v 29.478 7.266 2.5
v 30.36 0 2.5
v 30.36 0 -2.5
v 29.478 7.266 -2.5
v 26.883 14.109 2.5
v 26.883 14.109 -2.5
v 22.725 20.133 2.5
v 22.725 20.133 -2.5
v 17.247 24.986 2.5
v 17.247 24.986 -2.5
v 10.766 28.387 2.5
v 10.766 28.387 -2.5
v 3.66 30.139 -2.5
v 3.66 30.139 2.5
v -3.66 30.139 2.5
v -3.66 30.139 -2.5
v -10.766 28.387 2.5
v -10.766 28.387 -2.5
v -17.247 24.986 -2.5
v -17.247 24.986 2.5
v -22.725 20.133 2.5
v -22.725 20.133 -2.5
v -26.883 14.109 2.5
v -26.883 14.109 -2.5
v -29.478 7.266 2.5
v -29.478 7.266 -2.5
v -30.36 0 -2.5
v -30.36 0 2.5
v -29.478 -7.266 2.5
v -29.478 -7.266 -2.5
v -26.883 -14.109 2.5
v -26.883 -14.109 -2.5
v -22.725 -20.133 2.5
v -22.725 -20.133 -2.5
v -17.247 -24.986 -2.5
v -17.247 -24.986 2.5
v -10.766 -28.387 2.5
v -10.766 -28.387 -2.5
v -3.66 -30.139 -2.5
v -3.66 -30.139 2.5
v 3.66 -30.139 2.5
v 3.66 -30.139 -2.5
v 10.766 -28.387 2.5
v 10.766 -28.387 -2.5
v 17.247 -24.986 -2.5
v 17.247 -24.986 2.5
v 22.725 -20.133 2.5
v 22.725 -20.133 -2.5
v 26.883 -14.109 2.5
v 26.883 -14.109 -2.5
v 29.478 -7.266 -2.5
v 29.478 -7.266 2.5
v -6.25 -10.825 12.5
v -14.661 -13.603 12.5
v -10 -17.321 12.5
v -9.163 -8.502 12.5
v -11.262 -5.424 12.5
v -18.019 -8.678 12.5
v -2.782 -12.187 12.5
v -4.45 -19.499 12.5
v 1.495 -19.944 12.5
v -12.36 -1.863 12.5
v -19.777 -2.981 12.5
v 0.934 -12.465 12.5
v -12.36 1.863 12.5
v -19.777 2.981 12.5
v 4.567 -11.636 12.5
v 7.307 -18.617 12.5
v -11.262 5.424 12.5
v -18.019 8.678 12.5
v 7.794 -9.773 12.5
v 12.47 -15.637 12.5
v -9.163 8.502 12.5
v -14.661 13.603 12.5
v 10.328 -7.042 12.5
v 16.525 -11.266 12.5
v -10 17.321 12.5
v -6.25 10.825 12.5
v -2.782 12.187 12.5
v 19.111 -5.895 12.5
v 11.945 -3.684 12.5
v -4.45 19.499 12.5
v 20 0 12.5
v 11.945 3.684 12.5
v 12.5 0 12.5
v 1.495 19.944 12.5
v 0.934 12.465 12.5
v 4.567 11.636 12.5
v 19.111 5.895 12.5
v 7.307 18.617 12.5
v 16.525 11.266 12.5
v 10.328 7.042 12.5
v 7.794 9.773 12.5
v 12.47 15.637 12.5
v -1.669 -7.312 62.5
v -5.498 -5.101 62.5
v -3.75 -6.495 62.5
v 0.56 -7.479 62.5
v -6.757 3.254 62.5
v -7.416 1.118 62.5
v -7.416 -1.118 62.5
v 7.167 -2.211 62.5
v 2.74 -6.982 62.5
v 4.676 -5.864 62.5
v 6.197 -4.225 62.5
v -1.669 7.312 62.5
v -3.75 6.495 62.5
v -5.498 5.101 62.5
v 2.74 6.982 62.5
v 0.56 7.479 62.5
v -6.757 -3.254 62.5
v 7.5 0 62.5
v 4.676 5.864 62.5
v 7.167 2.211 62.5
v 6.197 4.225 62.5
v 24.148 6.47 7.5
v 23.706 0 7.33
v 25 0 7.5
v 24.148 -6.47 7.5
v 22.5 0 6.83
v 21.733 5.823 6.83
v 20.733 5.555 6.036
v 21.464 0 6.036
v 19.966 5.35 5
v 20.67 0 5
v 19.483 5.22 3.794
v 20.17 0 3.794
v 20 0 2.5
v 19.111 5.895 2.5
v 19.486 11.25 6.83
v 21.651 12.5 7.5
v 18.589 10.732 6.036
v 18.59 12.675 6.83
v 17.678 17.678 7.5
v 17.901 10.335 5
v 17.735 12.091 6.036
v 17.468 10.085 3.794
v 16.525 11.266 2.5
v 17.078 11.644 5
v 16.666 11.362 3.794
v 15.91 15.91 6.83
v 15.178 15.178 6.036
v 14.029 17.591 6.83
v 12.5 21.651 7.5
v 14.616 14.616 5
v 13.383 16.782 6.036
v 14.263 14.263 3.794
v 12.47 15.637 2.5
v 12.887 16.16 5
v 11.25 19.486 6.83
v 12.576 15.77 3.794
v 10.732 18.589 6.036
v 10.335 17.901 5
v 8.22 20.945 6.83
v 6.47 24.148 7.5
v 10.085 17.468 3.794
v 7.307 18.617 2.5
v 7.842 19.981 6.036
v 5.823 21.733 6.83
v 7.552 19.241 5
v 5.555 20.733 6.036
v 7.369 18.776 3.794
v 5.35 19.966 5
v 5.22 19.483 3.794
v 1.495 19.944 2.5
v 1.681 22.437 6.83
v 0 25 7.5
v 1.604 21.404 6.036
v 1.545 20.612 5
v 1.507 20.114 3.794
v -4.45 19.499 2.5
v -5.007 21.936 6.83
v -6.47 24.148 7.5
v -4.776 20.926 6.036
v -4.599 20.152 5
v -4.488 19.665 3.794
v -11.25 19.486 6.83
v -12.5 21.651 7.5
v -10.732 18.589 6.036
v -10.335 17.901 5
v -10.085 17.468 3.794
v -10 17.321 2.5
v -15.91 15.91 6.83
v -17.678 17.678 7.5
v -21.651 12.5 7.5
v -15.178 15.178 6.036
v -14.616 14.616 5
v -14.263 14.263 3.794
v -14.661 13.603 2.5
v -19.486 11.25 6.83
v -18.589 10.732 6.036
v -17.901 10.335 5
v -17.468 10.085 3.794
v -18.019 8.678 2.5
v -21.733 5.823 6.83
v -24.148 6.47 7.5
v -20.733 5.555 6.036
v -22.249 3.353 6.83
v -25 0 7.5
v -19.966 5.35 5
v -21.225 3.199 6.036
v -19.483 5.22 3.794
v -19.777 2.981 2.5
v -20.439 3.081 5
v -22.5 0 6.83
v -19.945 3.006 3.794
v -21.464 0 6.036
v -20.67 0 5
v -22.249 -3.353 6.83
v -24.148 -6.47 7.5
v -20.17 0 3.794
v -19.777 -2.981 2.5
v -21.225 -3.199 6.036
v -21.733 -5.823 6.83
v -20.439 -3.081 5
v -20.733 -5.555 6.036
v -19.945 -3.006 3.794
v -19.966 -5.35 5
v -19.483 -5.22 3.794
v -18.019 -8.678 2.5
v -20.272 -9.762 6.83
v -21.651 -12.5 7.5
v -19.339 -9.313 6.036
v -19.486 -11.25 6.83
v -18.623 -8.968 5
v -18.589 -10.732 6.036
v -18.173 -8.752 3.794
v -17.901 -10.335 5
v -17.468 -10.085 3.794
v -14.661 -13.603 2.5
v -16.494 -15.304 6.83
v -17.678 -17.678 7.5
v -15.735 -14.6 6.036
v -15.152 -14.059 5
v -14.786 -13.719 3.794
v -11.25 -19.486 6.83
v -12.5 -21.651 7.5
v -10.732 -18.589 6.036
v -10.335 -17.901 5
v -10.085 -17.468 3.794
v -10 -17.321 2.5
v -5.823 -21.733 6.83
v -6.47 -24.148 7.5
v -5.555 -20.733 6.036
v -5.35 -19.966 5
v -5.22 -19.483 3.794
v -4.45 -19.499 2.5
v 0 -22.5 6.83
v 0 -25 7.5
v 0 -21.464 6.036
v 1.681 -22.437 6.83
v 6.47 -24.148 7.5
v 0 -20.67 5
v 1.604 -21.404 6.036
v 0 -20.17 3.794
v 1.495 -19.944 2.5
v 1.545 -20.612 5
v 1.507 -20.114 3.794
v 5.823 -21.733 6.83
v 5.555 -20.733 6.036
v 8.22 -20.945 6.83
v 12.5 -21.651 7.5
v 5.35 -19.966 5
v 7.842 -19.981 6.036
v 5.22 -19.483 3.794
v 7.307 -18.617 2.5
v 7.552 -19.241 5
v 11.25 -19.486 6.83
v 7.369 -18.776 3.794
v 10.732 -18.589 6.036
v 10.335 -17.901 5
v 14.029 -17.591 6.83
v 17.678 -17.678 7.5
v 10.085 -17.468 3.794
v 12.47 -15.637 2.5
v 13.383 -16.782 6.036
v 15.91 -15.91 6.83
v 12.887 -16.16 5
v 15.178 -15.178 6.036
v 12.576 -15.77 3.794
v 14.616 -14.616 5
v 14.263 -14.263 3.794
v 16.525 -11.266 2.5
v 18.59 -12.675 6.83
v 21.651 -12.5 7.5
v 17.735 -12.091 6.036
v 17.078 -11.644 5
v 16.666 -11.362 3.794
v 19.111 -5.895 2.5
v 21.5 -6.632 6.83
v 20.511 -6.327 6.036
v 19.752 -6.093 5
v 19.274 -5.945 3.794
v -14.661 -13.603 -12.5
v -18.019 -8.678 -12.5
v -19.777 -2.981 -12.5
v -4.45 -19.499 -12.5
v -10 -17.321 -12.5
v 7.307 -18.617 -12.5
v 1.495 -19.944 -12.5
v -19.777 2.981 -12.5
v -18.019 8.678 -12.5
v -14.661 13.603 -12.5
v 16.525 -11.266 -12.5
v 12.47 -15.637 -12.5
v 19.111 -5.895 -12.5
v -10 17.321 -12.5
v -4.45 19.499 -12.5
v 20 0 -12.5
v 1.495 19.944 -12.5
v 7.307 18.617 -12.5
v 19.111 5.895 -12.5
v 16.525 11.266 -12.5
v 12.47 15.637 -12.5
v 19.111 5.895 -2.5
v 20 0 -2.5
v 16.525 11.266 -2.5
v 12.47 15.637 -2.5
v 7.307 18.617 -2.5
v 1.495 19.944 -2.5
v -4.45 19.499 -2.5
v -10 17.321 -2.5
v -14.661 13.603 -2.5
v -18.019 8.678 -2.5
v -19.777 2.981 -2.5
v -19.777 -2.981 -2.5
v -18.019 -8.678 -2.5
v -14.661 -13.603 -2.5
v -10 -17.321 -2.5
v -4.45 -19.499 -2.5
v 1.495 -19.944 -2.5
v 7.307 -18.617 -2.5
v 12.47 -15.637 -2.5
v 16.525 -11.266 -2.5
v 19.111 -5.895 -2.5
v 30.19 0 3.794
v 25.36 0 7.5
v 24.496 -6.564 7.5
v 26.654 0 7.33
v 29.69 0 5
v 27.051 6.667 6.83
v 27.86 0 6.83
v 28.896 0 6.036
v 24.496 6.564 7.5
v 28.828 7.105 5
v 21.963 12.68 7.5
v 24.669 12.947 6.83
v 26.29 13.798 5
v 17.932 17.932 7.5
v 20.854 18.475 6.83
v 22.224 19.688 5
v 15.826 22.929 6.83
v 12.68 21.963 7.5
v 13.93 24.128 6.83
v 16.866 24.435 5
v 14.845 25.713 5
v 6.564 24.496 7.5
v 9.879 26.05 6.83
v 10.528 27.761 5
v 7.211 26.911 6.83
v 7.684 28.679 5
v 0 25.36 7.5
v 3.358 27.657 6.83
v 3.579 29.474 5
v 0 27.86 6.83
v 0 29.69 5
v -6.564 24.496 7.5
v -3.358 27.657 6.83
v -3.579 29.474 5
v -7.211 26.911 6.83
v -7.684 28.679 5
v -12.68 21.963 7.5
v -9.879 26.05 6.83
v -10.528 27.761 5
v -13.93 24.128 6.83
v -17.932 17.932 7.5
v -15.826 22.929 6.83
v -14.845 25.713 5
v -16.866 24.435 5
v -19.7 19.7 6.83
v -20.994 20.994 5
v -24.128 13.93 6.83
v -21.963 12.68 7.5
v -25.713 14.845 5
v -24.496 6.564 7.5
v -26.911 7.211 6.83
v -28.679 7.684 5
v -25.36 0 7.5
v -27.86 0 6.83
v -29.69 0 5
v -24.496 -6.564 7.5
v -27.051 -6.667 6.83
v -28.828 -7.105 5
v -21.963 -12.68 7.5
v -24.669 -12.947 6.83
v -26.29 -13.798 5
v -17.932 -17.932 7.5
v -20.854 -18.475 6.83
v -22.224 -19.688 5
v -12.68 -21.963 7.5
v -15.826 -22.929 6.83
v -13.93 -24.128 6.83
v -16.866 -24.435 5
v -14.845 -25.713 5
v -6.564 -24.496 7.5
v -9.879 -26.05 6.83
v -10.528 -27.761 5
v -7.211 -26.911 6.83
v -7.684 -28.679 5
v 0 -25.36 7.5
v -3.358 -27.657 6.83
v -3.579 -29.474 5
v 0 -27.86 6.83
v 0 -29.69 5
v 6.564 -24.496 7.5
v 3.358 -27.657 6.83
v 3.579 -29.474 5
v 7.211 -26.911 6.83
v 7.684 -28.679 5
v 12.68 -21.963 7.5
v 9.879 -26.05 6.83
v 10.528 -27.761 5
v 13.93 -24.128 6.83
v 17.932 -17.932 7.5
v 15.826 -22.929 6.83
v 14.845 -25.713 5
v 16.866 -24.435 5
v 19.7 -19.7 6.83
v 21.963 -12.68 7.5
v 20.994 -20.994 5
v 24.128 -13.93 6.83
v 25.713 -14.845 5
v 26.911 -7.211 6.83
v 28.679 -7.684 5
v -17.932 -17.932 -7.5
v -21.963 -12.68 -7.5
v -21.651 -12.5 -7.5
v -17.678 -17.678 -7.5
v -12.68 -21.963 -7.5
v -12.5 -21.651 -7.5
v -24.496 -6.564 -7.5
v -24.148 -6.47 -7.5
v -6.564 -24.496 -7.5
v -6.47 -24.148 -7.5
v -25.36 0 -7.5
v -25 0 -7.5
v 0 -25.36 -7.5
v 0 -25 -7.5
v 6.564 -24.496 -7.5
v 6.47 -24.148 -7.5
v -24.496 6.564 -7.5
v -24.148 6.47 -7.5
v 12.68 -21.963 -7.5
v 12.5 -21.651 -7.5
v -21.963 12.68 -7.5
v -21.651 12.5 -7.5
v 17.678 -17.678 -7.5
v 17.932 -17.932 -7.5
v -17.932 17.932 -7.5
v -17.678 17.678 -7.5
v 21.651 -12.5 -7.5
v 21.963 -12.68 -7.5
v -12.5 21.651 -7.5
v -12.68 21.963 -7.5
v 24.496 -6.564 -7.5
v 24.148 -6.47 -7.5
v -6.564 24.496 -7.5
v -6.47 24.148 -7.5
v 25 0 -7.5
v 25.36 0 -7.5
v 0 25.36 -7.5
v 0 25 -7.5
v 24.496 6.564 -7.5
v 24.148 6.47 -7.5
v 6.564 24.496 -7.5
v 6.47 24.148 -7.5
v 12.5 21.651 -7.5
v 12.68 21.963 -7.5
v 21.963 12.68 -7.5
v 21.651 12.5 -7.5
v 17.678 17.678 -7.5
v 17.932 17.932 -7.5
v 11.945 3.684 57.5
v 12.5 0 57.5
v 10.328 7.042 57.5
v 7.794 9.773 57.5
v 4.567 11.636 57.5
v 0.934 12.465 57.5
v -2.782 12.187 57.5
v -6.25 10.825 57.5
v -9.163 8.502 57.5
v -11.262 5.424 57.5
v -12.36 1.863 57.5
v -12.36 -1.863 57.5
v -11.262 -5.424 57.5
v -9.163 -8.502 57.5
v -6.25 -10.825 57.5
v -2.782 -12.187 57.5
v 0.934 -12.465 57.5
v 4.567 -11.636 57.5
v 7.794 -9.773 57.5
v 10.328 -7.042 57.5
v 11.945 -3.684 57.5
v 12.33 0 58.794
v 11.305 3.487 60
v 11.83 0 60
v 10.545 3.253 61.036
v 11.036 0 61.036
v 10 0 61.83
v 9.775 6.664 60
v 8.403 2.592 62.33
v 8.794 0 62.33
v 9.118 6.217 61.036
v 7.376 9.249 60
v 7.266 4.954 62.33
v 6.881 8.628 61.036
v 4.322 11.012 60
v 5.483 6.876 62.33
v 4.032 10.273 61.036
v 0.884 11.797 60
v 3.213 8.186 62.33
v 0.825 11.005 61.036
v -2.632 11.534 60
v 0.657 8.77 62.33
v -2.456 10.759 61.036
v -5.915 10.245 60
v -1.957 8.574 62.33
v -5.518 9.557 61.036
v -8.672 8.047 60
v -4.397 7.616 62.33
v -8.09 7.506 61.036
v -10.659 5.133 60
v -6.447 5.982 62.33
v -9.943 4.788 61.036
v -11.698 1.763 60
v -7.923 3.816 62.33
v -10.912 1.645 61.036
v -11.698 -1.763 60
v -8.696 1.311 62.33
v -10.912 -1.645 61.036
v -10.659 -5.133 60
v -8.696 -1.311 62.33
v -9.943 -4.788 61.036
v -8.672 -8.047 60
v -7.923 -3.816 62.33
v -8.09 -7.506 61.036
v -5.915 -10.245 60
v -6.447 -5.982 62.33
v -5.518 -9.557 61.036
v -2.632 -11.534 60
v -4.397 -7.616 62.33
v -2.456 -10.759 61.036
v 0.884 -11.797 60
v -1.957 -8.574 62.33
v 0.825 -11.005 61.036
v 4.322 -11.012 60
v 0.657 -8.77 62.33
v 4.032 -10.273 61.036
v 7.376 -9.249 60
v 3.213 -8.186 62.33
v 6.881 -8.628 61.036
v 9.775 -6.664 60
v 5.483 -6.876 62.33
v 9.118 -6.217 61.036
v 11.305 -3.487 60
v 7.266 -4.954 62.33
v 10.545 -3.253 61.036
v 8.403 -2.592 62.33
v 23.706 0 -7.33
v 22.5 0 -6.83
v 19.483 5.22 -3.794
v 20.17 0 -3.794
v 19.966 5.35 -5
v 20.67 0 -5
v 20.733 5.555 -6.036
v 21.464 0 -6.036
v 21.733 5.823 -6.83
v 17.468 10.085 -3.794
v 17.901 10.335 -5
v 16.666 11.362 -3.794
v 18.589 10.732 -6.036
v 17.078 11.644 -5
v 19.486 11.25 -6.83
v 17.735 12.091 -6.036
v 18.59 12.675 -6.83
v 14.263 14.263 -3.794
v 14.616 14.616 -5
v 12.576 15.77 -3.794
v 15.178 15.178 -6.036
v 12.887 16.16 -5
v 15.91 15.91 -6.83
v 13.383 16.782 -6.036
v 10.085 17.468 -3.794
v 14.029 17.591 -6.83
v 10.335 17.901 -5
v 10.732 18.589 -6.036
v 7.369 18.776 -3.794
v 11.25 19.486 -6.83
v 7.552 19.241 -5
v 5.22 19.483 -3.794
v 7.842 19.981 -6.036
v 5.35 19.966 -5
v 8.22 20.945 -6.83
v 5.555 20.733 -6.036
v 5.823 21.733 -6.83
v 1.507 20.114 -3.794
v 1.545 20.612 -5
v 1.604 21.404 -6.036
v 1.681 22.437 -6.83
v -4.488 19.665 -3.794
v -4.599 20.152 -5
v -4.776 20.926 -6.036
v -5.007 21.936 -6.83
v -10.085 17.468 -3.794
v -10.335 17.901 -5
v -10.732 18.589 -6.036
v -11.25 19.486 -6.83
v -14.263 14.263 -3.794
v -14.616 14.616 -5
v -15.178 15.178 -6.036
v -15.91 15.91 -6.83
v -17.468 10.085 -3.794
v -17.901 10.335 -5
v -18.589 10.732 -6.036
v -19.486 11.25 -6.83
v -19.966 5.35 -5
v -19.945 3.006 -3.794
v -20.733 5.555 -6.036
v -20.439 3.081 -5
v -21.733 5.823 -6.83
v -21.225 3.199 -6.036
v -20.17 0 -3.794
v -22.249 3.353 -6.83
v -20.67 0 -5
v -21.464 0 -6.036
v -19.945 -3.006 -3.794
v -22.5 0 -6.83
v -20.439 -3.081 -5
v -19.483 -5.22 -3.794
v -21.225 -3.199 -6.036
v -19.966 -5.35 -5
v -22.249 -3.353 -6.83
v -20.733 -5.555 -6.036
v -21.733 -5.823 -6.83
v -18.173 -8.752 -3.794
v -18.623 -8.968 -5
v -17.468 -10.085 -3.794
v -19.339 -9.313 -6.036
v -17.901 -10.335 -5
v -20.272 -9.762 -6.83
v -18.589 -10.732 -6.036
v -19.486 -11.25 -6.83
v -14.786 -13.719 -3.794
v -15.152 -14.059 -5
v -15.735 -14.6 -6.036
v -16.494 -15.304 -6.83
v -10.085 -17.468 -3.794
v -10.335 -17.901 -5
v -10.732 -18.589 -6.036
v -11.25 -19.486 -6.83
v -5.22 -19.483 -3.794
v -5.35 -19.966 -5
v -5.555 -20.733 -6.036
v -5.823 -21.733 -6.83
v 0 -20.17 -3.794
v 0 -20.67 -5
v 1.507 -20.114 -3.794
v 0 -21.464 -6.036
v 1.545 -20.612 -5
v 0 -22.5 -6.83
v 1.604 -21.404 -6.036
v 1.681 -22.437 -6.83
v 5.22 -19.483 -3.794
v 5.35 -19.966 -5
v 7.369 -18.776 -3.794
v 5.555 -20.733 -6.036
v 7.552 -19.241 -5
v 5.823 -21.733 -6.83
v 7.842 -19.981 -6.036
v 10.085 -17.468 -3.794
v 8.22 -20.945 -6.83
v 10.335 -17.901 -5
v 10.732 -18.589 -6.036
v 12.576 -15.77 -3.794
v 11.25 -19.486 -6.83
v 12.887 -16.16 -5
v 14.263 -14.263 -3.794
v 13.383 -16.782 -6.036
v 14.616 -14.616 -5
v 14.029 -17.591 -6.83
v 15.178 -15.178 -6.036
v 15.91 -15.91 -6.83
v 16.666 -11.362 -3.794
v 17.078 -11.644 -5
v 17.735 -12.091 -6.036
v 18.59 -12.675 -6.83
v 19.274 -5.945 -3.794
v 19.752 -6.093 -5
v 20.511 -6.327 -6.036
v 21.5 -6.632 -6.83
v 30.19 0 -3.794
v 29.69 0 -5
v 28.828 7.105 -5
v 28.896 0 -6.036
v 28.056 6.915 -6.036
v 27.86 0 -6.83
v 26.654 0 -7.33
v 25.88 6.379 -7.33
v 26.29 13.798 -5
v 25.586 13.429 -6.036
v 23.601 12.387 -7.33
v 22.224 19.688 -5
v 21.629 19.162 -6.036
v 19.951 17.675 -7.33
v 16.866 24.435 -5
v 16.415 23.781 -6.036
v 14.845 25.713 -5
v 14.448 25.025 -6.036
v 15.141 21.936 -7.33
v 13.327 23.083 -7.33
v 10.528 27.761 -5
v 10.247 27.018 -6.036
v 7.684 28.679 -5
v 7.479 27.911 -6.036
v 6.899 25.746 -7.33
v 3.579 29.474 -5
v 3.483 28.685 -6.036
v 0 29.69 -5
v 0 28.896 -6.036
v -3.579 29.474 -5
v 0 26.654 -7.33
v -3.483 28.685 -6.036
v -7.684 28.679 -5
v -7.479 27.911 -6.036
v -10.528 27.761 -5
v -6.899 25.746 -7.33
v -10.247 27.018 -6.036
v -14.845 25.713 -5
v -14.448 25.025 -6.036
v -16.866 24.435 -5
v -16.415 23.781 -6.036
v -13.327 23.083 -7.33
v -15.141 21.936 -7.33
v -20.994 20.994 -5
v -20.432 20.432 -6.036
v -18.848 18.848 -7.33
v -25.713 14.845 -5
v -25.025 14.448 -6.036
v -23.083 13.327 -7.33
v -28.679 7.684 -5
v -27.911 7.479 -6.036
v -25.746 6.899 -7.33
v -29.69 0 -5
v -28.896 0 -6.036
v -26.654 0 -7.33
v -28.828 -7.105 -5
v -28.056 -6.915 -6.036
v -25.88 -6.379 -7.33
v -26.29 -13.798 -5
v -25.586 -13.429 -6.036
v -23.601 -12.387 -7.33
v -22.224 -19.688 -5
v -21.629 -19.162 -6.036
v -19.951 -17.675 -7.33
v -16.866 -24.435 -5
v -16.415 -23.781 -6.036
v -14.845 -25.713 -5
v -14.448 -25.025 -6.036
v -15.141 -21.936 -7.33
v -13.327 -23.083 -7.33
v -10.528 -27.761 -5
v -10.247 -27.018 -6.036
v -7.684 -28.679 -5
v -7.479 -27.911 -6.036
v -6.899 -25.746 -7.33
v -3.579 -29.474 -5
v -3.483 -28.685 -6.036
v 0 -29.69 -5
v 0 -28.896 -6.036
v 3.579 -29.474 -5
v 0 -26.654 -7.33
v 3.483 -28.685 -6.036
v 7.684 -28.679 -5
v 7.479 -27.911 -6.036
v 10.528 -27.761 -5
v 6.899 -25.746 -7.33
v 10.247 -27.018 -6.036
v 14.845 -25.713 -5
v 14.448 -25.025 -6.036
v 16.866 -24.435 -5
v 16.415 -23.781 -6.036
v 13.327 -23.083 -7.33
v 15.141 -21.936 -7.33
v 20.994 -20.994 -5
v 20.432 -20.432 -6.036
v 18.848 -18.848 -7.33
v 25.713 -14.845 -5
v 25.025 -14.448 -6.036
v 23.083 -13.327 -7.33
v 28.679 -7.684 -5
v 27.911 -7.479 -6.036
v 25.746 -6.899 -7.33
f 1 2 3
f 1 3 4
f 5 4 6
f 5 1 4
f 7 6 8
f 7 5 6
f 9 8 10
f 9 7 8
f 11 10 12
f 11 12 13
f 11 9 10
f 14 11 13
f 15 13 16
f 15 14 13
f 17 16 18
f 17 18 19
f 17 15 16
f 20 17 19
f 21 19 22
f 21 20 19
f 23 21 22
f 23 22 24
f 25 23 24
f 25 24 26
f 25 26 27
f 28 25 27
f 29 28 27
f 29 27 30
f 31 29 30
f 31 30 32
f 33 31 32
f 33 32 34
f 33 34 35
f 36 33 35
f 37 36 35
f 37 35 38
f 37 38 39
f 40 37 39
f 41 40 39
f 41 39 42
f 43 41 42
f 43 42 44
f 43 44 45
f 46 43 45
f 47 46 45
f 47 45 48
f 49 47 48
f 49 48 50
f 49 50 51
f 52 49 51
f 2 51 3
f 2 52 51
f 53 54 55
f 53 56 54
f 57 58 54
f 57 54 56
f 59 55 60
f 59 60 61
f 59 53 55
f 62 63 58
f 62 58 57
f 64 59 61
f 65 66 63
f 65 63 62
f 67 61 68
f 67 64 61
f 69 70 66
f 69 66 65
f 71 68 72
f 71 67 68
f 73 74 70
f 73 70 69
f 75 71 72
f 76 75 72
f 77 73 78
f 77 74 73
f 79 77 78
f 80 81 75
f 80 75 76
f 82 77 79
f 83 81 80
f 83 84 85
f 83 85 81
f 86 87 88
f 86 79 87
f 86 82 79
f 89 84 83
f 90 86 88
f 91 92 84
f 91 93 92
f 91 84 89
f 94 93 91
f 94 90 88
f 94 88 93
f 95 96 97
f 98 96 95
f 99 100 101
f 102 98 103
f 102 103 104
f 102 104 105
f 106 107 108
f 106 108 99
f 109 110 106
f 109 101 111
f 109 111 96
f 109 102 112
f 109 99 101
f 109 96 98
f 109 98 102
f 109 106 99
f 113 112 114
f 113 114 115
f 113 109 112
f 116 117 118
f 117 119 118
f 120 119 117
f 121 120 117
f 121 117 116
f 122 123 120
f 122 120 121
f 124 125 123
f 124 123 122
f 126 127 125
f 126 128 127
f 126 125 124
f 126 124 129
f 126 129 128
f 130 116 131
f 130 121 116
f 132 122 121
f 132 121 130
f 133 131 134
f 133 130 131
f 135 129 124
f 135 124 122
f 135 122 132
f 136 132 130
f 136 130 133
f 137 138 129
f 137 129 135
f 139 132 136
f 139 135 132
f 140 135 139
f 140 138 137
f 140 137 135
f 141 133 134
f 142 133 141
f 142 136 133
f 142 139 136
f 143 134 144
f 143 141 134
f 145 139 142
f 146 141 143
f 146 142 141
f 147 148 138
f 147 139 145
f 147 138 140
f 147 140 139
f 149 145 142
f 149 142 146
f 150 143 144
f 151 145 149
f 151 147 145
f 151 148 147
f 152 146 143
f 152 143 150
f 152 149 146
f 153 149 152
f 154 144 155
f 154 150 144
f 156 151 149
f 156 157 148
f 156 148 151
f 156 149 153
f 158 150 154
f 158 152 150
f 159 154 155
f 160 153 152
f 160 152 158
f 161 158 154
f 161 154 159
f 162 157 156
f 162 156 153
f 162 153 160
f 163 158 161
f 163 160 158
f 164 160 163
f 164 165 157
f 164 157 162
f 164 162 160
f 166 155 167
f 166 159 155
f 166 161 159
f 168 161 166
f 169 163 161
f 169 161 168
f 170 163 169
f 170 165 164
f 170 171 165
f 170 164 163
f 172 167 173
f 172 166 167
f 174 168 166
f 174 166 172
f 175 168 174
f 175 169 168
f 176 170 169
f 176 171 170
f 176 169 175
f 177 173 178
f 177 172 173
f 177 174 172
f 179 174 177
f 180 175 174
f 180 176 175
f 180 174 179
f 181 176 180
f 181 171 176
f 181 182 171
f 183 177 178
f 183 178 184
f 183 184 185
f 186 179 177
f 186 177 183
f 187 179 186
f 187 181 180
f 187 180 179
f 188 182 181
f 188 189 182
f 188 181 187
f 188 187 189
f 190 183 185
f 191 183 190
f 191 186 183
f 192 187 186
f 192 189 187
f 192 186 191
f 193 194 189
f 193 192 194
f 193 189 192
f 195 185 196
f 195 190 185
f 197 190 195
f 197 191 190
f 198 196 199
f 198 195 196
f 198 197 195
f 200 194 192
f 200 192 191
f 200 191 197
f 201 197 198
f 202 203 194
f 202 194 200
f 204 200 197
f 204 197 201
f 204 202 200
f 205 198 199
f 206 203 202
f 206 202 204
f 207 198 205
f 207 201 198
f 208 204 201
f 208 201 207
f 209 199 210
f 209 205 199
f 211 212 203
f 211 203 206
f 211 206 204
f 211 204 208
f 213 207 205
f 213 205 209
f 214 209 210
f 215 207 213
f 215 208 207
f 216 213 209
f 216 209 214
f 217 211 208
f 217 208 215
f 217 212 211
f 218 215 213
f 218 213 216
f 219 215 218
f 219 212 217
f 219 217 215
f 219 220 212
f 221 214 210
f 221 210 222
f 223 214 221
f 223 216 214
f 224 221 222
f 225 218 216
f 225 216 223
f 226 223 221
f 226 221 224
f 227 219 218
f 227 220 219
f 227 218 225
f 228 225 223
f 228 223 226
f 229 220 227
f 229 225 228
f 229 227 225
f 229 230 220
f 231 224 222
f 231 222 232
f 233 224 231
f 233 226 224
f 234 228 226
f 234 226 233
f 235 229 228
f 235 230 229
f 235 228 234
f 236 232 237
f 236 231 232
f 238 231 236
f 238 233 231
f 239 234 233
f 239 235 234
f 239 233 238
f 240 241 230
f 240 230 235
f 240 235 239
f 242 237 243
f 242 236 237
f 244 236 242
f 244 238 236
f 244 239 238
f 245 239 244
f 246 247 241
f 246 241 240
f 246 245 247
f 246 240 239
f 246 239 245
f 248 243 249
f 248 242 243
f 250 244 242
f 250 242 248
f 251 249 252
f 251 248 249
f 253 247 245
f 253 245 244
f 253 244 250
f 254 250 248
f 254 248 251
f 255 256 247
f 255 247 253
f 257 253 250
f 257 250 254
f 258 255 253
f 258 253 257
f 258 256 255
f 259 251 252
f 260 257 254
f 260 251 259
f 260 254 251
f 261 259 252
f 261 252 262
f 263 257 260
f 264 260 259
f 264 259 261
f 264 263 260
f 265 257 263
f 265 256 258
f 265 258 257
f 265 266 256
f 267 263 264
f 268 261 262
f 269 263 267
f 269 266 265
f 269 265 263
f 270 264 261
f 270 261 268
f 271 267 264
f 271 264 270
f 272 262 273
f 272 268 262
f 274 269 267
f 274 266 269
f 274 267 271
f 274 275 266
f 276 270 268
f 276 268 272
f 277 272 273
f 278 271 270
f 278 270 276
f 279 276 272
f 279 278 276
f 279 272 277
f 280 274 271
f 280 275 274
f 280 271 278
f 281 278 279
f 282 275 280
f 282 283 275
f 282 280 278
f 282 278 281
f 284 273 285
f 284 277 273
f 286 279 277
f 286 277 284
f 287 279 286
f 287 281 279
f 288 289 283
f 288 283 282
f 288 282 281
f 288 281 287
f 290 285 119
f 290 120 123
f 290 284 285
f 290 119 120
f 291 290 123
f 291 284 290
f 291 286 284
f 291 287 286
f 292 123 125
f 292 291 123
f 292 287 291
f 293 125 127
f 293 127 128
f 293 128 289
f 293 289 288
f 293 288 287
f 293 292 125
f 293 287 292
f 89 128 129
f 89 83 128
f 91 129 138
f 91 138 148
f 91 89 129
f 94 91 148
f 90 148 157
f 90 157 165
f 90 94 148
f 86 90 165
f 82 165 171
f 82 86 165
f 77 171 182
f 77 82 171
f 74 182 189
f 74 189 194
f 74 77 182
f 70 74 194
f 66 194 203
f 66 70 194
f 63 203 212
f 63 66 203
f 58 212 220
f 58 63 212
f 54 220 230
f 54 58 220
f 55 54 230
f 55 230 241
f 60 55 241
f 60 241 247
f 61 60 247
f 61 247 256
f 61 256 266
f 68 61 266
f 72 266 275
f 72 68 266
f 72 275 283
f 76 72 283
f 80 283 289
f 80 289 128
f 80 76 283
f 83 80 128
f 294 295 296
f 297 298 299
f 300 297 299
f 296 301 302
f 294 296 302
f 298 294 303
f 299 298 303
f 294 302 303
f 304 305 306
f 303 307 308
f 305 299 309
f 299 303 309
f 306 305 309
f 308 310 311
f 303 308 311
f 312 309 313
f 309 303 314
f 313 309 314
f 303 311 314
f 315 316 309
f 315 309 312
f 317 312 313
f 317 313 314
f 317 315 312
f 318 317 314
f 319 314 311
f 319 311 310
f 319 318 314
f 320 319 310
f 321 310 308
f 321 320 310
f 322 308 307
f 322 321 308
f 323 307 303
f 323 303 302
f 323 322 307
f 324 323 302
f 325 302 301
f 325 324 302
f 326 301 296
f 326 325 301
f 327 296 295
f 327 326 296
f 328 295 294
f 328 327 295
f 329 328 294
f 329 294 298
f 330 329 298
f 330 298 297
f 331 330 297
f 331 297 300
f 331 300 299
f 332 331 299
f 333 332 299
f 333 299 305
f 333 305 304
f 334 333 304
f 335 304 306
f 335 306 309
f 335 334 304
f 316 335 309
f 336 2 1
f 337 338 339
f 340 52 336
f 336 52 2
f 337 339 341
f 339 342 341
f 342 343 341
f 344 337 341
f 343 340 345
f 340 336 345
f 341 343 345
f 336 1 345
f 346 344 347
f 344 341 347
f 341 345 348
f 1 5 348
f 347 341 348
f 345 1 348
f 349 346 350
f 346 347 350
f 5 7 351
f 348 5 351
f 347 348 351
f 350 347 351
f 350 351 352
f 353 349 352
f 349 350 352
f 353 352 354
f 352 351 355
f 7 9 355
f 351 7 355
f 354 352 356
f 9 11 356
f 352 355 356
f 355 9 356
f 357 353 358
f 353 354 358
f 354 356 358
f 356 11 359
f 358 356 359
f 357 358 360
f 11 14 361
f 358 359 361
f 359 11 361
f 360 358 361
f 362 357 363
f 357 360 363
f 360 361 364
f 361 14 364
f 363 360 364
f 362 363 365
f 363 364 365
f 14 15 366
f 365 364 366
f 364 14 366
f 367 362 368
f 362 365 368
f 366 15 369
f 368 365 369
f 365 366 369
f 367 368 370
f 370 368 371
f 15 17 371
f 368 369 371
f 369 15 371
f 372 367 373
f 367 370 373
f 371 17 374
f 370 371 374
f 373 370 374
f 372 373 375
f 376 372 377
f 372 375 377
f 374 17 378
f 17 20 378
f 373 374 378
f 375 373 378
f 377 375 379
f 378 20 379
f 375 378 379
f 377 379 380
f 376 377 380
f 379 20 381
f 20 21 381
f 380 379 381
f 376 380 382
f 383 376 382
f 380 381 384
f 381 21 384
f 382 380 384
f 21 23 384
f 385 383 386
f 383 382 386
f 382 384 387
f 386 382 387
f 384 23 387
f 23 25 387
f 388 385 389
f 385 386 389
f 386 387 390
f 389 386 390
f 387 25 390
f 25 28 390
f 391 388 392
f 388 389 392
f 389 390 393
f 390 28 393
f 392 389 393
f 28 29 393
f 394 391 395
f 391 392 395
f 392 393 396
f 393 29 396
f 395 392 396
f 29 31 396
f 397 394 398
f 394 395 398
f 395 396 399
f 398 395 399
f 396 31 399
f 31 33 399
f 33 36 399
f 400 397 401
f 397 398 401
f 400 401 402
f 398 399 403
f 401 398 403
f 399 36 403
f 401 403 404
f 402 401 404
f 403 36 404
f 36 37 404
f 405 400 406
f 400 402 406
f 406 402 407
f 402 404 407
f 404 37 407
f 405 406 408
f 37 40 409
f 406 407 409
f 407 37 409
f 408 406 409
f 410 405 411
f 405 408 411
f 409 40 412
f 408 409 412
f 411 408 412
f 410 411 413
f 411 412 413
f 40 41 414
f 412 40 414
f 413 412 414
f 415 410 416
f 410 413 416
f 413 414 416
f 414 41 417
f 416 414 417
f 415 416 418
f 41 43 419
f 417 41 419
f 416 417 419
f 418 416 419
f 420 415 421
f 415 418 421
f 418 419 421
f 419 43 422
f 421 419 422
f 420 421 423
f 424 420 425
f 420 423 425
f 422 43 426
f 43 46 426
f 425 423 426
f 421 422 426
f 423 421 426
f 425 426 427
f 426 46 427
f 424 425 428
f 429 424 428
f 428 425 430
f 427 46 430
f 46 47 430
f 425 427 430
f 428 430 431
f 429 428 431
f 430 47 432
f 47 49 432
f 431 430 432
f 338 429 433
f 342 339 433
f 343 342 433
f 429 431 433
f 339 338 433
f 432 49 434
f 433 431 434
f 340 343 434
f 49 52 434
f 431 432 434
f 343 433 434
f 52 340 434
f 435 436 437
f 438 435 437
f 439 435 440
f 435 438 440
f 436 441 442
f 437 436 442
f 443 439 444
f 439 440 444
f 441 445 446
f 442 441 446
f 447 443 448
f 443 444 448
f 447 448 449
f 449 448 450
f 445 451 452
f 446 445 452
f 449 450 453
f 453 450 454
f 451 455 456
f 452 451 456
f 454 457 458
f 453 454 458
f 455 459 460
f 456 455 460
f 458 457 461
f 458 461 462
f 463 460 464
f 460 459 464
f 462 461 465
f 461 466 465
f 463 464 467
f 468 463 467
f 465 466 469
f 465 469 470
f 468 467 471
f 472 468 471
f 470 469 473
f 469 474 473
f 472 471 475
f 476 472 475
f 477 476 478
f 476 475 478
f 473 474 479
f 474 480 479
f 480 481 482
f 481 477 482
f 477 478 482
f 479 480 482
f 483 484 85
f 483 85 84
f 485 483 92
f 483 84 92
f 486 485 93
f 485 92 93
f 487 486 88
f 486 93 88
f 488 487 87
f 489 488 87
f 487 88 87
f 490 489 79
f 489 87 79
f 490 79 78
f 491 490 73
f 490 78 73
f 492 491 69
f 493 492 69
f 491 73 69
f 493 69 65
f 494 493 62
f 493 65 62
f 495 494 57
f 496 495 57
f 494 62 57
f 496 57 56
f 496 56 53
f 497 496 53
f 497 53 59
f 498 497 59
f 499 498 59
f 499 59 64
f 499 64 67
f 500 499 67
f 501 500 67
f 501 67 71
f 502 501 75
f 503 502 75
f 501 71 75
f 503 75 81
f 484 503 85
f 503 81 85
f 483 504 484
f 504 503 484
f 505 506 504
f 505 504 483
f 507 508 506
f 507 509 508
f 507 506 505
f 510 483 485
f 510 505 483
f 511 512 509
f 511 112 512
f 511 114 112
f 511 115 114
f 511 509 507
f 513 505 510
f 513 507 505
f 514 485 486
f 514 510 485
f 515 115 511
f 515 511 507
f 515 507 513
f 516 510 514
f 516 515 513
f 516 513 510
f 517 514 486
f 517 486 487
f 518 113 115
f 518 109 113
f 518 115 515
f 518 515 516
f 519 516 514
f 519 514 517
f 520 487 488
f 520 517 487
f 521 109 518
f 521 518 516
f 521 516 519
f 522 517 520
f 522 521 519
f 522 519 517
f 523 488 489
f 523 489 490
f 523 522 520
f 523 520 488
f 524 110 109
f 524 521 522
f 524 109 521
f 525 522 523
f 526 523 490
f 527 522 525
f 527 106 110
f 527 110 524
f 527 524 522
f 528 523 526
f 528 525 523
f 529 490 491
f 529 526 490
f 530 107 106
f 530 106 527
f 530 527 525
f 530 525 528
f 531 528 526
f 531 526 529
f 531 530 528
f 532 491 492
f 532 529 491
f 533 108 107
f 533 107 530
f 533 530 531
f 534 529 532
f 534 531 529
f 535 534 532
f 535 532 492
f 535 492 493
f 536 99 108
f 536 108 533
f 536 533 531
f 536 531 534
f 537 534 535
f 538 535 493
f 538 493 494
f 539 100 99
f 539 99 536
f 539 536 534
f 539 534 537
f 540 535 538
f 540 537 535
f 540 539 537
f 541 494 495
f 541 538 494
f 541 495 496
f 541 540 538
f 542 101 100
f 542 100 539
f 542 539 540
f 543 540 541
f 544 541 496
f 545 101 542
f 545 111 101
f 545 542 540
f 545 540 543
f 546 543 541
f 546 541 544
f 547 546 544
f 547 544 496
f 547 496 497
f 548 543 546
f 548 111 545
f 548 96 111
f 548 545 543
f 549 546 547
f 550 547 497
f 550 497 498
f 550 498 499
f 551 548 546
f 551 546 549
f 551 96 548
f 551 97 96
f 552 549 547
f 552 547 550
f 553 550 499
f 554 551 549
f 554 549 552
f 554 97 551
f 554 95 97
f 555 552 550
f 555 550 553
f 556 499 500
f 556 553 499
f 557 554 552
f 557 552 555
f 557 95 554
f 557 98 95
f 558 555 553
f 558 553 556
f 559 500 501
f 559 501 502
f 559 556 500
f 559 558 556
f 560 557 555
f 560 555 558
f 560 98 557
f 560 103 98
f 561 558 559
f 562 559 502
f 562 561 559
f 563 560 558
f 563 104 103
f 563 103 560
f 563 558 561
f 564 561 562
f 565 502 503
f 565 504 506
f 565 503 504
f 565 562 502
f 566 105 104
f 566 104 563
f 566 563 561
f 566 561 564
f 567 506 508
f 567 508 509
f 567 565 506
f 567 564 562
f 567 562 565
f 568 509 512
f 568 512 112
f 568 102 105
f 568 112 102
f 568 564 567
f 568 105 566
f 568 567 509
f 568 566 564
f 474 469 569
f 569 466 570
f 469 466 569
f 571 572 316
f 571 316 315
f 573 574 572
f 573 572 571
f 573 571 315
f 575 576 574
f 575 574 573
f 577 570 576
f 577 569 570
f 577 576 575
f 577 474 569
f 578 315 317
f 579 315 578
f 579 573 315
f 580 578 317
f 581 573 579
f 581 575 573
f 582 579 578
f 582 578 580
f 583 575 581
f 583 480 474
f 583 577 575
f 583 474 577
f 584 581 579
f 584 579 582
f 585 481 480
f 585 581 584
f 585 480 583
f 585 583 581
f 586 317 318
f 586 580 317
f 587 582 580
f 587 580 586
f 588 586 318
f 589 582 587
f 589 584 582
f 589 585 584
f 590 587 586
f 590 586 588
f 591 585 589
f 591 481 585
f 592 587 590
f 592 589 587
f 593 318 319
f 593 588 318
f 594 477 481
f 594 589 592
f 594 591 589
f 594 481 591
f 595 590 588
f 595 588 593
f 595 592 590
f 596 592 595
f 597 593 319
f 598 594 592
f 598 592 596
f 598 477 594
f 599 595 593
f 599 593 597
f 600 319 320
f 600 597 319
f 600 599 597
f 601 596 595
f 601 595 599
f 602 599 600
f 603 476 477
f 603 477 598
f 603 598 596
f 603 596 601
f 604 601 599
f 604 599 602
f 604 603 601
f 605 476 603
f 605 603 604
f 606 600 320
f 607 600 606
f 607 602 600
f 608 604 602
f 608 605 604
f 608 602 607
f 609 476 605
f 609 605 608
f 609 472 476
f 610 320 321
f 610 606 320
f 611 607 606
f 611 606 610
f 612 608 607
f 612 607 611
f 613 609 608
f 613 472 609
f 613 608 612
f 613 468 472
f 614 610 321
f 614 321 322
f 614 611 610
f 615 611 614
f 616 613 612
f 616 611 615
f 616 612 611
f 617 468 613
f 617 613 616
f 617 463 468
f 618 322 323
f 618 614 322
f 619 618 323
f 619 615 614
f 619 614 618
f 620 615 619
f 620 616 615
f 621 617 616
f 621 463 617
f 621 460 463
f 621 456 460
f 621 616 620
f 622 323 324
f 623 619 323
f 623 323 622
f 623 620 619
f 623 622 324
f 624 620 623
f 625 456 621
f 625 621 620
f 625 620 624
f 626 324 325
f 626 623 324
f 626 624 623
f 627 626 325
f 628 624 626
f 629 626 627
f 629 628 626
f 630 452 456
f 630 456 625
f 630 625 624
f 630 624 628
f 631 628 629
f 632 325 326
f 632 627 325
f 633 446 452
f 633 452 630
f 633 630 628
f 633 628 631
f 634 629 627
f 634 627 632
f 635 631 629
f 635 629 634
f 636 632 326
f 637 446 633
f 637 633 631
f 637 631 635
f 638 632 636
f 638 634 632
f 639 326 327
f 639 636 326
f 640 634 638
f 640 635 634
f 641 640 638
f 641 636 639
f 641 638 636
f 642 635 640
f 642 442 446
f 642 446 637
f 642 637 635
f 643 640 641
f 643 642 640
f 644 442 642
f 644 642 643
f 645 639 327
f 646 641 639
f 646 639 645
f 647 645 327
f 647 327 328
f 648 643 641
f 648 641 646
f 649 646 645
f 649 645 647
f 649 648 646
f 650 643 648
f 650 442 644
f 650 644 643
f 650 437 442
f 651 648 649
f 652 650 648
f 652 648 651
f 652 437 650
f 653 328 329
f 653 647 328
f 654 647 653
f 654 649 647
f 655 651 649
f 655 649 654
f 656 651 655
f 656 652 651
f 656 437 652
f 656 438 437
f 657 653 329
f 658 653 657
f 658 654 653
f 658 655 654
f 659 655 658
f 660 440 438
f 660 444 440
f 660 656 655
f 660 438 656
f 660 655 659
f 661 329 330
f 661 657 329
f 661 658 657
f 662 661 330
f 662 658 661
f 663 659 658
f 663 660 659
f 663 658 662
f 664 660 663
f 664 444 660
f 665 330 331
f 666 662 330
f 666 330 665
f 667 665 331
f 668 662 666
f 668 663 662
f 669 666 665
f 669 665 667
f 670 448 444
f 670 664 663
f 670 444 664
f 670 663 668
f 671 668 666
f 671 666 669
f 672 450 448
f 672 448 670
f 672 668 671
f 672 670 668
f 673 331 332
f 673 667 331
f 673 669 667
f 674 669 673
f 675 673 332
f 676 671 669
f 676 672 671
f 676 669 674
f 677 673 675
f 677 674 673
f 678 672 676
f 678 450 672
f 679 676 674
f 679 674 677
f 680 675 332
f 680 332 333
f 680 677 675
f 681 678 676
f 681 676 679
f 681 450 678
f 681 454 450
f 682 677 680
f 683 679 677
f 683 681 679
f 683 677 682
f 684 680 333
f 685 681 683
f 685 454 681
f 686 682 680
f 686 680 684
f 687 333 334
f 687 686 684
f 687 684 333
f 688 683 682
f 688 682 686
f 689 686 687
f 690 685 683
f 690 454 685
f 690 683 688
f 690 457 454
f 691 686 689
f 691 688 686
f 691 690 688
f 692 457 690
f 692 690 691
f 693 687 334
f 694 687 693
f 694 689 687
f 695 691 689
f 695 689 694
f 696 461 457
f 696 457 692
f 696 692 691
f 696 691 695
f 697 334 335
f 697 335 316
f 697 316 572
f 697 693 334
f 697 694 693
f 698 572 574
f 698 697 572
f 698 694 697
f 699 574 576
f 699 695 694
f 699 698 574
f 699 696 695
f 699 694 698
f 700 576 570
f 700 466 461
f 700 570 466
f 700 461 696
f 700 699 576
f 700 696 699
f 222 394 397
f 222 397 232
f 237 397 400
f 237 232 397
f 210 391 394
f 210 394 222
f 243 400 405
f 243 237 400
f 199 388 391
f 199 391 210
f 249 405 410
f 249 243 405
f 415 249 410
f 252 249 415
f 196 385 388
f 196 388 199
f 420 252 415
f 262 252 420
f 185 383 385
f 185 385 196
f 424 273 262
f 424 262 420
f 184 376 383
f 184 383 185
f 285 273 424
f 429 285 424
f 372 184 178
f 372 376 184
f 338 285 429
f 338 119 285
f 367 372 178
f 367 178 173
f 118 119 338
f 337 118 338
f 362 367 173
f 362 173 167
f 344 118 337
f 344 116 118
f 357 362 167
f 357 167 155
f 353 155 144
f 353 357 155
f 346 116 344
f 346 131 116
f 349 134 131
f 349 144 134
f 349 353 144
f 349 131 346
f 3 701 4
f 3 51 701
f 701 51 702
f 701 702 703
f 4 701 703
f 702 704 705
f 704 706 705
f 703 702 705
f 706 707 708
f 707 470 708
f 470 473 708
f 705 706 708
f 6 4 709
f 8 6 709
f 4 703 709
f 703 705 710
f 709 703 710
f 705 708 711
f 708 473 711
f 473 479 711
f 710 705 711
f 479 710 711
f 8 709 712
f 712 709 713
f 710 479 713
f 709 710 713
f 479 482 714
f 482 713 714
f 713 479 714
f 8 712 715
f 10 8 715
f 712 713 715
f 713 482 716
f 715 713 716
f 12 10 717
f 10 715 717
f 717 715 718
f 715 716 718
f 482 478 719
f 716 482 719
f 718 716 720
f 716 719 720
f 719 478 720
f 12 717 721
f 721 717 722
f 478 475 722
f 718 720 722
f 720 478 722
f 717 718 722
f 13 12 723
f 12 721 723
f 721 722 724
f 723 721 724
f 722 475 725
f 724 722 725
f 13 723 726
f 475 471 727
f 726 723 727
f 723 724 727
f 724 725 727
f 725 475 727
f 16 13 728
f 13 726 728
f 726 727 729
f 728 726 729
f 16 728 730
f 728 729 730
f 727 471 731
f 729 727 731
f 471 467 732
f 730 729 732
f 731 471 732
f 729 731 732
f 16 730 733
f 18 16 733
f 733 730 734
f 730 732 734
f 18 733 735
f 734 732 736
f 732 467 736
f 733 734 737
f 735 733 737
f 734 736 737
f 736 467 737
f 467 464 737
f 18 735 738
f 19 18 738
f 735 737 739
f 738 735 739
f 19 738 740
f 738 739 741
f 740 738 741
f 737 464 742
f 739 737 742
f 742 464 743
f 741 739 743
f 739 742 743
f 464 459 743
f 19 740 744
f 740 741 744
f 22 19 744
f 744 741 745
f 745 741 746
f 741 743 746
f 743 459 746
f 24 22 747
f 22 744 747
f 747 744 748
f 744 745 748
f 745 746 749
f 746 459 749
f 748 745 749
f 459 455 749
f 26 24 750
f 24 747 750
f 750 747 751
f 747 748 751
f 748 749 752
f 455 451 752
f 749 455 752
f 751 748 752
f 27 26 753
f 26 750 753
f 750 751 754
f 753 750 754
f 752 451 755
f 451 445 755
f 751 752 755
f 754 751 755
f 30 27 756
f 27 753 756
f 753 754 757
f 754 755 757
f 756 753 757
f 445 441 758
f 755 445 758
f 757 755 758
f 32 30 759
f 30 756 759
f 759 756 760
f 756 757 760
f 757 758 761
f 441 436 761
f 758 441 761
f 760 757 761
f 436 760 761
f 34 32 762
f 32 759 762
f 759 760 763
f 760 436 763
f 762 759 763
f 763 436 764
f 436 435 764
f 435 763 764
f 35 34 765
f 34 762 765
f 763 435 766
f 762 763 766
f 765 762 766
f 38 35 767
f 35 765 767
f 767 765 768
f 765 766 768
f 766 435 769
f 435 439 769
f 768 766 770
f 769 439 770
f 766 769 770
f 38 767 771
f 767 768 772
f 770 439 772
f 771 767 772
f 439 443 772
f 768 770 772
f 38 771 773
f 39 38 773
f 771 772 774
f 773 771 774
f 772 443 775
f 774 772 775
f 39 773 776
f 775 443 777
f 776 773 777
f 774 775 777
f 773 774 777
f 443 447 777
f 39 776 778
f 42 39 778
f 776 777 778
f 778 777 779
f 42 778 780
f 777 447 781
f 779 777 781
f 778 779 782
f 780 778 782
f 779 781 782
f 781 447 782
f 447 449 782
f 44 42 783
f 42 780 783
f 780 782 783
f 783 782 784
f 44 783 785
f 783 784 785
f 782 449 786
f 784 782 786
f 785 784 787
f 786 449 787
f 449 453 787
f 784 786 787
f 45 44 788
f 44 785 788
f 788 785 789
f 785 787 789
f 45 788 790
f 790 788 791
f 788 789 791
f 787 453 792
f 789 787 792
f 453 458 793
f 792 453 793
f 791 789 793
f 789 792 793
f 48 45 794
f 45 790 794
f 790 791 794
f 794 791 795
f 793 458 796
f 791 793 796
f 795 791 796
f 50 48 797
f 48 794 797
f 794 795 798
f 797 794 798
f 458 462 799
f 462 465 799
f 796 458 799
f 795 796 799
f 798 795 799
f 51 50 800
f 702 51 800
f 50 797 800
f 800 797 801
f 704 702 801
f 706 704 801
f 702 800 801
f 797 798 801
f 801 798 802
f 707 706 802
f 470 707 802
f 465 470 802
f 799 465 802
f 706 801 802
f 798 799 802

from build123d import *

# Parameters (mm, degrees)
F0_R     = 30.360351
F0_R_2   = 20
F1_DEPTH = 7.5
F2_R     = 5
F3_R     = 5
F4_R     = 5
F5_DEPTH = 12.5
F6_R     = 12.5
F7_DEPTH = 50
F8_R     = 5


with BuildPart() as f1:
    # F0 (on Top) → F1 (new body, symmetric)
    with BuildSketch(Plane.XY):
        Circle(F0_R)
        Circle(F0_R_2, mode=Mode.SUBTRACT)
    extrude(amount=F1_DEPTH, both=True)

    # F2
    f2_edges = [f1.edges().sort_by_distance(p)[0] for p in [
        (-30.360351, 0, -7.5),
        (-20, 0, -7.5),
    ]]
    fillet(f2_edges, radius=F2_R)

    # F3
    f3_edges = [f1.edges().sort_by_distance(p)[0] for p in [
        (-20, 0, 7.5),
    ]]
    fillet(f3_edges, radius=F3_R)

    # F4
    f4_edges = [f1.edges().sort_by_distance(p)[0] for p in [
        (-30.360351, 0, 7.5),
    ]]
    fillet(f4_edges, radius=F4_R)

    # F0 (on Top) → F5 (join, symmetric)
    with BuildSketch(Plane.XY):
        Circle(F0_R_2)
    extrude(amount=F5_DEPTH, both=True)

    # F6 (on face) → F7 (join)
    with BuildSketch(Plane.XY.offset(12.5)):
        Circle(F6_R)
    extrude(amount=F7_DEPTH)

    # F8
    f8_edges = [f1.edges().sort_by_distance(p)[0] for p in [
        (-12.5, 0, 62.5),
    ]]
    fillet(f8_edges, radius=F8_R)


solid = f1.part
